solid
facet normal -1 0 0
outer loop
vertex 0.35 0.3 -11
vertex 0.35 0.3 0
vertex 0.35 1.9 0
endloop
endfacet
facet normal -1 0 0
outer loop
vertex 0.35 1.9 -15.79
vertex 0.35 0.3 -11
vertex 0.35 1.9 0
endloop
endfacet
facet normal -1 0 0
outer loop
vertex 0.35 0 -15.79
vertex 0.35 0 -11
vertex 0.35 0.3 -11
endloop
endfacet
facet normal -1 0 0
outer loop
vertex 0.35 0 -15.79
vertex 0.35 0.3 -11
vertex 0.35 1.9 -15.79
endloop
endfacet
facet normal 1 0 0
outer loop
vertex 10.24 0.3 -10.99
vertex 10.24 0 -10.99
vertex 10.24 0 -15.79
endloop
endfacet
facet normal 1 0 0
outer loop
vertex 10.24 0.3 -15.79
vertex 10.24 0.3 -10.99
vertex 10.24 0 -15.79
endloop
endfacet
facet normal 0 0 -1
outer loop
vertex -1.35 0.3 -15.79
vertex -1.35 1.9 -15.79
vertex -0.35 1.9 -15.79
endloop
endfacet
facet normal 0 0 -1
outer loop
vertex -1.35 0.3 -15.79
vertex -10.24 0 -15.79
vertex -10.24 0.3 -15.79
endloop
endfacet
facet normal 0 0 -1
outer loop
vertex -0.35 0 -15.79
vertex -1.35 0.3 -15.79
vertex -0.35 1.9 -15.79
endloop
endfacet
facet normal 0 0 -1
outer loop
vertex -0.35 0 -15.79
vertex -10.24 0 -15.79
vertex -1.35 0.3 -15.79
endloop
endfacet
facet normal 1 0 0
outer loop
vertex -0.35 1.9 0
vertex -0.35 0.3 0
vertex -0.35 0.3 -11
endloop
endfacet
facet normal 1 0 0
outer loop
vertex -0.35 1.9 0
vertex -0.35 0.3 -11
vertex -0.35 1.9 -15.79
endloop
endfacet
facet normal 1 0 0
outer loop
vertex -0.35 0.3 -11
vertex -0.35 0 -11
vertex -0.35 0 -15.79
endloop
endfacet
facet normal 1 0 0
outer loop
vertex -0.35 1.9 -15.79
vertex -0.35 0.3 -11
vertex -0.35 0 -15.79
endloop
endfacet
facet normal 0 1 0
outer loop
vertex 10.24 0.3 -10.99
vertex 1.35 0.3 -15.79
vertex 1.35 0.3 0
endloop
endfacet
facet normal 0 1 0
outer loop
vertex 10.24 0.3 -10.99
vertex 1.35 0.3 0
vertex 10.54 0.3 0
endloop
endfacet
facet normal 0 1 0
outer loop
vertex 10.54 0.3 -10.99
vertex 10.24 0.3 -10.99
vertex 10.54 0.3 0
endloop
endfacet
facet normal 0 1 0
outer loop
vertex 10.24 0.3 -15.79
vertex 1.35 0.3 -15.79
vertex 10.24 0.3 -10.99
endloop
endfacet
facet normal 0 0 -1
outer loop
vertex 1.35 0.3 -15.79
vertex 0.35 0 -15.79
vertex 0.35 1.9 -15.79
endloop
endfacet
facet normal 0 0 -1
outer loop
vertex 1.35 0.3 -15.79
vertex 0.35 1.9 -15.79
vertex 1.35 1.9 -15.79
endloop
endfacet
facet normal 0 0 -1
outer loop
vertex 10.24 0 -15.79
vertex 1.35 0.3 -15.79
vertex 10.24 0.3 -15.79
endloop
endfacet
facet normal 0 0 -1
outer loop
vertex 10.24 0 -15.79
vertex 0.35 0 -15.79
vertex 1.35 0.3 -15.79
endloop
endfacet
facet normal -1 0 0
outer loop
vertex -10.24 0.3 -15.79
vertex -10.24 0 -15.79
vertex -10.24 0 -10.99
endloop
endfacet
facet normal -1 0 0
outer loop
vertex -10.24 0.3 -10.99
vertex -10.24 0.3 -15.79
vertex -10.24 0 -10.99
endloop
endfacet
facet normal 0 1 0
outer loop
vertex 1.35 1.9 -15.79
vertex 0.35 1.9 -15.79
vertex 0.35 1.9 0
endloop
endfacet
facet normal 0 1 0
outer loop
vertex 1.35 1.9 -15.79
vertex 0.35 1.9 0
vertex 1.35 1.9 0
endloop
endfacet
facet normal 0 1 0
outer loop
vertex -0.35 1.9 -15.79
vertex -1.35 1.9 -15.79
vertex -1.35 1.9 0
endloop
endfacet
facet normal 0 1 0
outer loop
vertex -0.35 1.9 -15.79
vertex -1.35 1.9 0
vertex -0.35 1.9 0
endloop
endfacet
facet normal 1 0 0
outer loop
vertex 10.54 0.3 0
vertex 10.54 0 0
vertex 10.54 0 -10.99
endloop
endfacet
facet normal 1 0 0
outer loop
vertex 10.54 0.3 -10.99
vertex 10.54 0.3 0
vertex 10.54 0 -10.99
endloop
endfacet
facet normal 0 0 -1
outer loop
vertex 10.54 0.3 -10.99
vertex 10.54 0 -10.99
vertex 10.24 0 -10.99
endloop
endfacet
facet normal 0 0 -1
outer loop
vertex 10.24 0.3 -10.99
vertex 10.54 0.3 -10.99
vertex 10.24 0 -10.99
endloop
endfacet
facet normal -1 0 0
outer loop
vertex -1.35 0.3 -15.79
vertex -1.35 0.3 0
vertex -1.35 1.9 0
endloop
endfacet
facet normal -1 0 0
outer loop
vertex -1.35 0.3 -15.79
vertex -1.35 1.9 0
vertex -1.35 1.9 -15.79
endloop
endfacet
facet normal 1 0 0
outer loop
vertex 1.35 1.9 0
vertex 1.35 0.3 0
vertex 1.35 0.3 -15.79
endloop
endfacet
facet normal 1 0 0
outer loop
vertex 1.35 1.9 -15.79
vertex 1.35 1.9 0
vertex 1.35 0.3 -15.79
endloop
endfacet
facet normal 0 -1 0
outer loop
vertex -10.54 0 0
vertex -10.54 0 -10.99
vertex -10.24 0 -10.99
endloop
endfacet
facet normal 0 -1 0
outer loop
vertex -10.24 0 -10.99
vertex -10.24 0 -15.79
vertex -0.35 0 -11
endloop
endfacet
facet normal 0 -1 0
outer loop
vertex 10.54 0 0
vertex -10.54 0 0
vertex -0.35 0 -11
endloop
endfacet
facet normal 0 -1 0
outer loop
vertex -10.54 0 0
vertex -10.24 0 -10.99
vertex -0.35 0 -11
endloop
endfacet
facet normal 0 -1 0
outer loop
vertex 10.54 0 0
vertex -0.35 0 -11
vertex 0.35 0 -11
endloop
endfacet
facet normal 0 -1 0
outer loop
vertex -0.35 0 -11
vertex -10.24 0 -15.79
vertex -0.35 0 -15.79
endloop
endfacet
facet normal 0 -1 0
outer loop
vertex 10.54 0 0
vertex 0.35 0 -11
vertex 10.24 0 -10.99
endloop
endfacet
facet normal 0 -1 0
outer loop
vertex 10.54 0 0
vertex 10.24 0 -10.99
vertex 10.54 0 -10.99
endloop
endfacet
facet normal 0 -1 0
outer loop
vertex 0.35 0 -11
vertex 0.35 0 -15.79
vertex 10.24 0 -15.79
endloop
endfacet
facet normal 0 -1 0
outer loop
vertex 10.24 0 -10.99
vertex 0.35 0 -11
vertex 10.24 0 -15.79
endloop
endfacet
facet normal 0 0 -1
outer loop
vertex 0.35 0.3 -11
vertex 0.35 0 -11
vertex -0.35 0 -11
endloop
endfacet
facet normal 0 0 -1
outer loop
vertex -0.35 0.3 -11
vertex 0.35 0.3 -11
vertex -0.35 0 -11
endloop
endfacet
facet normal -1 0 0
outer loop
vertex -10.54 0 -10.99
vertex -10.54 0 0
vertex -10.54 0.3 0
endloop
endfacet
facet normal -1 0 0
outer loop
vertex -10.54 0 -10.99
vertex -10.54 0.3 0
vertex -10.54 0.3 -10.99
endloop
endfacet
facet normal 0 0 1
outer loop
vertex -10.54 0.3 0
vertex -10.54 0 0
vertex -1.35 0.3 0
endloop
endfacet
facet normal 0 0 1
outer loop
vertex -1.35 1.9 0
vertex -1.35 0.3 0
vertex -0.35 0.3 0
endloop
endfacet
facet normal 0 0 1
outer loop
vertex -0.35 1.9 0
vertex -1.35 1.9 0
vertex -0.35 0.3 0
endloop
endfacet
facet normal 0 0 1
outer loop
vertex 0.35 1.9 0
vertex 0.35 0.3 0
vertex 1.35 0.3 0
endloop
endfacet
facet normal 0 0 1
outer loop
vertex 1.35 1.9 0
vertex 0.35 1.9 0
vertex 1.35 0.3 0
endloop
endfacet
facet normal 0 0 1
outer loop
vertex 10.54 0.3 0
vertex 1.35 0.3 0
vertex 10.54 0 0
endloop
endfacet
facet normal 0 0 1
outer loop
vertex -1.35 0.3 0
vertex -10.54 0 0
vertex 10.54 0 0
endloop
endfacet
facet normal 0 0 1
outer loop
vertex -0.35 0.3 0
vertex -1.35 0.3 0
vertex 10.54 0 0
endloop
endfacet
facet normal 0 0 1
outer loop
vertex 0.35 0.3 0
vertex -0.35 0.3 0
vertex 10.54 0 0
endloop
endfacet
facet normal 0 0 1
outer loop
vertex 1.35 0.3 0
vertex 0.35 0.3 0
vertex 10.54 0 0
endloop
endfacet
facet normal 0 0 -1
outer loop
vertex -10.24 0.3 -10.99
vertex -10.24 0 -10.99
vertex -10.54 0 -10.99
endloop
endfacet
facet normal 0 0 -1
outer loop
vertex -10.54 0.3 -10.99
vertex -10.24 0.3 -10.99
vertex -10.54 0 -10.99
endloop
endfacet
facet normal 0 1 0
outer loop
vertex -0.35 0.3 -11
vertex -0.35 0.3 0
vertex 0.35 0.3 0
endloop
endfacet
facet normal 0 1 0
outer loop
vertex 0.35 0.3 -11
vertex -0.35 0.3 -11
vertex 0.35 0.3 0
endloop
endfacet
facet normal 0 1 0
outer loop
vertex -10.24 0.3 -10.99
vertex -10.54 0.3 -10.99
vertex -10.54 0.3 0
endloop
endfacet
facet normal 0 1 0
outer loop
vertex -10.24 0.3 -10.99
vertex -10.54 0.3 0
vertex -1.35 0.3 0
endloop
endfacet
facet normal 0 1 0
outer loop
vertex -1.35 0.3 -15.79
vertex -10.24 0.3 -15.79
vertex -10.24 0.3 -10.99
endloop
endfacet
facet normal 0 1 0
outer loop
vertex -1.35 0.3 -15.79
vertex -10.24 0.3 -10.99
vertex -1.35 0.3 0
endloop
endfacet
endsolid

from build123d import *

# Parameters (mm, degrees)
SKETCH1_W           = 9.89
SKETCH1_H           = 4.79
SKETCH1_H_2         = 0.01
SKETCH1_W_2         = 0.01
SKETCH1_H_3         = 10.99
SKETCH1_W_3         = 0.29
BOSS_EXTRUDE1_DEPTH = 0.3
SKETCH2_W           = 1
SKETCH2_H           = 15.79
BOSS_EXTRUDE2_DEPTH = 1.6


with BuildPart() as part:
    # Sketch1 → Boss-Extrude1 (new body)
    with BuildSketch(Plane(origin=(0, 0, 0), x_dir=(1, 0, 0), z_dir=(0, 1, 0))):
        with Locations((-5.295, 13.395)):
            Rectangle(SKETCH1_W, SKETCH1_H)
        with Locations((5.295, 13.395)):
            Rectangle(SKETCH1_W, SKETCH1_H)
        with Locations((-5.295, 10.995)):
            Rectangle(SKETCH1_W, SKETCH1_H_2)
        with Locations((5.295, 10.995)):
            Rectangle(SKETCH1_W, SKETCH1_H_2)
        Polygon((-0.35, 11), (-0.35, 10.99), (0.35, 10.99), (0.35, 11), (0.34, 11), (-0.34, 11), align=None)
        Polygon((-10.24, 10.99), (-10.24, 0), (10.24, 0), (10.24, 10.99), (0.35, 10.99), (-0.35, 10.99), align=None)
        with Locations((-10.245, 5.495)):
            Rectangle(SKETCH1_W_2, SKETCH1_H_3)
        with Locations((-10.395, 5.495)):
            Rectangle(SKETCH1_W_3, SKETCH1_H_3)
        with Locations((10.395, 5.495)):
            Rectangle(SKETCH1_W_3, SKETCH1_H_3)
        with Locations((10.245, 5.495)):
            Rectangle(SKETCH1_W_2, SKETCH1_H_3)
    extrude(amount=BOSS_EXTRUDE1_DEPTH)

    # Sketch2 → Boss-Extrude2 (add)
    with BuildSketch(Plane(origin=(0, 0.3, 0), x_dir=(1, 0, 0), z_dir=(0, 1, 0))):
        with Locations((-0.85, 7.895)):
            Rectangle(SKETCH2_W, SKETCH2_H)
        with Locations((0.85, 7.895)):
            Rectangle(SKETCH2_W, SKETCH2_H)
    extrude(amount=BOSS_EXTRUDE2_DEPTH)


solid = part.part
